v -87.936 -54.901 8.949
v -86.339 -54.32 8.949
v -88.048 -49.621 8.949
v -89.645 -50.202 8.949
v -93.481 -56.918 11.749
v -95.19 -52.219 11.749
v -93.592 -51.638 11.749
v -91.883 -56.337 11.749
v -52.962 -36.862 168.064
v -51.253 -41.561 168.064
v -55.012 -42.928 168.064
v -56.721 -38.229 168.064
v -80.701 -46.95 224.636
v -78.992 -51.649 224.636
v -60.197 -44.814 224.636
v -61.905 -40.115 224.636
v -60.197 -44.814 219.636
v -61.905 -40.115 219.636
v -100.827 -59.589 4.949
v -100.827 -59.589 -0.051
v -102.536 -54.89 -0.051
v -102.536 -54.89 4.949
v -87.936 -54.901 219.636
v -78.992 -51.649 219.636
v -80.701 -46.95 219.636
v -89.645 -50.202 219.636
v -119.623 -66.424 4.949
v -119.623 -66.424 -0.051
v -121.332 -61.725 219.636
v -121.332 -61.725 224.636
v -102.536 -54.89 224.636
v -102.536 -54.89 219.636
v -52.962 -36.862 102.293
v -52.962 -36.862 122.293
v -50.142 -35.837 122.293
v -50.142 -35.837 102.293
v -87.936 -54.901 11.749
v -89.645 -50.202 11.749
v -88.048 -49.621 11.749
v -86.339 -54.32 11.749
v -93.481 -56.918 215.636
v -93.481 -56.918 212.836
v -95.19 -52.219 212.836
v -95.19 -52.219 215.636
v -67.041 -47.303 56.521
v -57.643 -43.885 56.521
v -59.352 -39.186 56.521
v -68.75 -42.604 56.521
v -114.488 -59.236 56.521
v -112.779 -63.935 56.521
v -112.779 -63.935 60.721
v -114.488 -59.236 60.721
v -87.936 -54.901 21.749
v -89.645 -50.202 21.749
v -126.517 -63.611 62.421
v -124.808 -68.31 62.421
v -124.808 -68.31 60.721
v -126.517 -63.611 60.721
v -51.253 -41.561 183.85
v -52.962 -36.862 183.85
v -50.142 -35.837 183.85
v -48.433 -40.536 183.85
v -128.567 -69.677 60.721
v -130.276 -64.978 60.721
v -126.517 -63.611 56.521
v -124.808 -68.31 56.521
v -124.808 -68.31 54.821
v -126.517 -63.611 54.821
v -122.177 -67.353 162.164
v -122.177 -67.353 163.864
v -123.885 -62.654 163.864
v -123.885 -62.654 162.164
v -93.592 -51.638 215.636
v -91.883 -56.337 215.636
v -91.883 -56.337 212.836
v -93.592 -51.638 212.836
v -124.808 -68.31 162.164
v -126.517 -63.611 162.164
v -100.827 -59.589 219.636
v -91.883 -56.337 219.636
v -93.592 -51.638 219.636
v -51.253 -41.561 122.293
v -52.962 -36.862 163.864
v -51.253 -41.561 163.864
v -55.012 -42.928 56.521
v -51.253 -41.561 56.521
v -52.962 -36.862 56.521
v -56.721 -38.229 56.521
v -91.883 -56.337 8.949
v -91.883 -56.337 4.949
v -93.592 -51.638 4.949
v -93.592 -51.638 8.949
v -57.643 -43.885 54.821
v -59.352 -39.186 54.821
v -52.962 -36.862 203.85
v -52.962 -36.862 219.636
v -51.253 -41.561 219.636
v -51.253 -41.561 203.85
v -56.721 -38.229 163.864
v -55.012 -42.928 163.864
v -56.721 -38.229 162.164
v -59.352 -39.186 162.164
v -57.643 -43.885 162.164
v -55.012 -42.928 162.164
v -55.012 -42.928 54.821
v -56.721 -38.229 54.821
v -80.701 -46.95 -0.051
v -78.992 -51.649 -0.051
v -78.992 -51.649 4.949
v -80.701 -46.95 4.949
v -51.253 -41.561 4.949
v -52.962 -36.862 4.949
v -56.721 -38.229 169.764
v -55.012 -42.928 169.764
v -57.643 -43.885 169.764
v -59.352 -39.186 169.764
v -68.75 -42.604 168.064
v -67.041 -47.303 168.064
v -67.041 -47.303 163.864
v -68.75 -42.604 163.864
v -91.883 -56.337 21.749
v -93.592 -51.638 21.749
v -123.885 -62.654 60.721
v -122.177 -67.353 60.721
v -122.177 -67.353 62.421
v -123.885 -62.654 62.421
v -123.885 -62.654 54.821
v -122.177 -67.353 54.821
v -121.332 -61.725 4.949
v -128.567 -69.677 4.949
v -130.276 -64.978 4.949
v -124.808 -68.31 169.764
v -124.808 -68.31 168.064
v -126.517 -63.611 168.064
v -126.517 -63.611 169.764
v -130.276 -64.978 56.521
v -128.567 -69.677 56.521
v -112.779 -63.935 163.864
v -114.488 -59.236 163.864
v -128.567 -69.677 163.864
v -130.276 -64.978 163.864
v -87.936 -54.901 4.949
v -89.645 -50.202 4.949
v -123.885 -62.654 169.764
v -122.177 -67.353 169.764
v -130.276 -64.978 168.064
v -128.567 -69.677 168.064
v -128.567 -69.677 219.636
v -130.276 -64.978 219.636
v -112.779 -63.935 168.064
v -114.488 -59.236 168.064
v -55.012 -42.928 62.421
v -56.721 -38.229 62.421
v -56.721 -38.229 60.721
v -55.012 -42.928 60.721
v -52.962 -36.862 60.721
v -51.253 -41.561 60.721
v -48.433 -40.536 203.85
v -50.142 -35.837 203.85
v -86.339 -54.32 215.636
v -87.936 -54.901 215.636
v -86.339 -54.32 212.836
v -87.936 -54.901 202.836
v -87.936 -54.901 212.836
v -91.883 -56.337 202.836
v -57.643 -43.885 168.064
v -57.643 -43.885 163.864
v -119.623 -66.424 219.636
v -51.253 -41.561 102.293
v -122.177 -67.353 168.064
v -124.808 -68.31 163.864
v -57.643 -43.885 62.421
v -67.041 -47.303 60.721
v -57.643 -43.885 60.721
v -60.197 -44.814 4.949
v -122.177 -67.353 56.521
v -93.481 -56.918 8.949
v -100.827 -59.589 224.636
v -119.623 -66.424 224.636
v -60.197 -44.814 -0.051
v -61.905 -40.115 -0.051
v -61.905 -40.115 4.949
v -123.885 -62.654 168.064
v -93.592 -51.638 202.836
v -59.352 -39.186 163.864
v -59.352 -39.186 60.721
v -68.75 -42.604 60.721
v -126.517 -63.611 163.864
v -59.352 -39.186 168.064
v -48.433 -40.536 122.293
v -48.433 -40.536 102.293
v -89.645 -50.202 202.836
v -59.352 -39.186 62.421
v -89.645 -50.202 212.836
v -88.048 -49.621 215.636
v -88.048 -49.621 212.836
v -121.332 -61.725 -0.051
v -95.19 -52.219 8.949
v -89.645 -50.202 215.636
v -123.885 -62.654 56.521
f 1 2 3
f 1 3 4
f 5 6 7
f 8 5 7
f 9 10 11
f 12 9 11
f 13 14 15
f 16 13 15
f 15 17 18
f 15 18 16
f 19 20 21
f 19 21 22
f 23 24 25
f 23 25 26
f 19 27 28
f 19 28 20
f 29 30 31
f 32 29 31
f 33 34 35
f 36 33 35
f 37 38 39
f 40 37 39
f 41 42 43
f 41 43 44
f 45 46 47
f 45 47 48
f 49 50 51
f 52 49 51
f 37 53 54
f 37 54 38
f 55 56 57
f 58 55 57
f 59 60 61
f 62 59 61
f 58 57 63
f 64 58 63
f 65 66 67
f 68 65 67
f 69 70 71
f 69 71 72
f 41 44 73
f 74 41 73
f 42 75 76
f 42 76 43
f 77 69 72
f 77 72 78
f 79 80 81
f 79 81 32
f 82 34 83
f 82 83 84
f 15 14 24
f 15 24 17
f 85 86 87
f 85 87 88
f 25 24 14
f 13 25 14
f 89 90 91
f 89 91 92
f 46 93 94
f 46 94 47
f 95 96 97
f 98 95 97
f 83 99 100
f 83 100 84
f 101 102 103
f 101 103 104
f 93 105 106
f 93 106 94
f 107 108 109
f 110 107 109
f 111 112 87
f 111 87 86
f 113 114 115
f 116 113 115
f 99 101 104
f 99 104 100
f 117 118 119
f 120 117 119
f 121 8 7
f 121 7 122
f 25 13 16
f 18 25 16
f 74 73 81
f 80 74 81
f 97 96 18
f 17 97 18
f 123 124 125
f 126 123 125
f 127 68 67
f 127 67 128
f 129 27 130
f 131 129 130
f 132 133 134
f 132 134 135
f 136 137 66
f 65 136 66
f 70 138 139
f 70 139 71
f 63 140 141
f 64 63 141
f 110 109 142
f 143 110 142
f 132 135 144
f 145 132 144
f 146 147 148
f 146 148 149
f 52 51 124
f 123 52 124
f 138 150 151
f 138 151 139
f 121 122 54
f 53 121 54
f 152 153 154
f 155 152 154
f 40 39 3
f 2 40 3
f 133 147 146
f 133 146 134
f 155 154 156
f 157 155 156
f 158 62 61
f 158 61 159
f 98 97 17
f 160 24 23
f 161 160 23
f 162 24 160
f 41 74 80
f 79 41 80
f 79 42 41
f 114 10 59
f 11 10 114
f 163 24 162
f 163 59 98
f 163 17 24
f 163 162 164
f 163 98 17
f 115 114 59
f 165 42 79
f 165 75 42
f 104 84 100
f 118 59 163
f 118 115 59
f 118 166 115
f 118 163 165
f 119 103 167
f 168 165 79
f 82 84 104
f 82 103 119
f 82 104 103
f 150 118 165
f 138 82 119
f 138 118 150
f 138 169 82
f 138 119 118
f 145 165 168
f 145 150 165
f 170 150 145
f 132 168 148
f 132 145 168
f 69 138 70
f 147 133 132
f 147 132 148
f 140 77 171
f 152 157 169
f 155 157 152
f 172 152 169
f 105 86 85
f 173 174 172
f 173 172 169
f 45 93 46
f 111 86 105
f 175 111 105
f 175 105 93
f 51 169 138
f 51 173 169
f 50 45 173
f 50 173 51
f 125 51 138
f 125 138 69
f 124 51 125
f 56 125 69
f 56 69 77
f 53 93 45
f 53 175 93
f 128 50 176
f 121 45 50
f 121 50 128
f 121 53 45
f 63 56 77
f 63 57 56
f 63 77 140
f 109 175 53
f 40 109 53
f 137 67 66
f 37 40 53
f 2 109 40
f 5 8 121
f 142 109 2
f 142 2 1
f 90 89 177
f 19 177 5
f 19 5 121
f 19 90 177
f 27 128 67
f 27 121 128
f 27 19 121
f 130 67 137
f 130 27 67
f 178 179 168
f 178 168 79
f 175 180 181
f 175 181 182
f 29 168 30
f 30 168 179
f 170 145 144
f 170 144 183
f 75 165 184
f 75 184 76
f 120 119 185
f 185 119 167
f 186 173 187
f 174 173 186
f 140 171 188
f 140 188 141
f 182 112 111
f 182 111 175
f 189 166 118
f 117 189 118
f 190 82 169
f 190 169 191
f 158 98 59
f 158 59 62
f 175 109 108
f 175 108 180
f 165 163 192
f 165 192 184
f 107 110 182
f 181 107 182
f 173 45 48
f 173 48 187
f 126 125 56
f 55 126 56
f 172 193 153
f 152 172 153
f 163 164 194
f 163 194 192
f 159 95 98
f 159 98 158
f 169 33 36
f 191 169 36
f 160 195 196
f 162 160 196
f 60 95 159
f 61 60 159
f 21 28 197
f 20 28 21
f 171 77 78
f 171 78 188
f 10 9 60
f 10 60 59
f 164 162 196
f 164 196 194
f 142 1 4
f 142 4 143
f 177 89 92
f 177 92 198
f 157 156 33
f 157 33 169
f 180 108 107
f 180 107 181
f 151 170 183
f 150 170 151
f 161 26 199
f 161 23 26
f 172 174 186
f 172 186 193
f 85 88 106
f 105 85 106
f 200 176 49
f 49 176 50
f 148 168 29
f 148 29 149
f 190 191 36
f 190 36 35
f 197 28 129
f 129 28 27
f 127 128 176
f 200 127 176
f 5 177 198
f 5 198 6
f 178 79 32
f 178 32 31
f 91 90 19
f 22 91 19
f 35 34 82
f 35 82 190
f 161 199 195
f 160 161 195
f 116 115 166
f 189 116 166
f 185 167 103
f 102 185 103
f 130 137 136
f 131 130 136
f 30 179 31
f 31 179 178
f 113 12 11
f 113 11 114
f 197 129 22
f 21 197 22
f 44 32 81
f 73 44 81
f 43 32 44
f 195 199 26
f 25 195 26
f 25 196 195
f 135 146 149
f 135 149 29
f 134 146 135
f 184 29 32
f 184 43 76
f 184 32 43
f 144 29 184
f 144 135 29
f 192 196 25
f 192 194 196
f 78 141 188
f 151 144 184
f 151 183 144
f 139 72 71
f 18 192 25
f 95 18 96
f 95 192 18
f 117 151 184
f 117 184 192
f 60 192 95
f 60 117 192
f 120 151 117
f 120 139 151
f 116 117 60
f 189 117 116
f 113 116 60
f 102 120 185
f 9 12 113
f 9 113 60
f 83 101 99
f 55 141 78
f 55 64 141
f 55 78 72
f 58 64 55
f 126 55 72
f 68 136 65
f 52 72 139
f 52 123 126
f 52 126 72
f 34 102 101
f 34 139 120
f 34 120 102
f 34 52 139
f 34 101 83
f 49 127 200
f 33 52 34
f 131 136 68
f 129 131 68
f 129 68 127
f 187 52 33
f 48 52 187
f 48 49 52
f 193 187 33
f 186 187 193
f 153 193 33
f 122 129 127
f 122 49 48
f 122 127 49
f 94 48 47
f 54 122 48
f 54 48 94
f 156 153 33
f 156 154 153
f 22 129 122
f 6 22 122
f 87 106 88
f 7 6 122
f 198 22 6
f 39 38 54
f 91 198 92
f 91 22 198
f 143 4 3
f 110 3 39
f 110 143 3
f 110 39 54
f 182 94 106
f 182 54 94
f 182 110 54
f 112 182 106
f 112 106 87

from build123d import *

# Parameters (mm, degrees)
BOSS_EXTRUDE1_DEPTH = 214.686455
CUT_EXTRUDE3_DEPTH  = 32.423010849
SKETCH5_W           = 20
SKETCH5_H           = 5
SKETCH5_W_2         = 3
SKETCH5_H_2         = 20
BOSS_EXTRUDE2_DEPTH = 5


with BuildPart() as part:
    # Sketch2 → Boss-Extrude1 (new body)
    with BuildSketch(Plane.XY.offset(4.949356739)):
        Polygon((-52.961538618, -36.862052104), (-51.252736373, -41.56098761), (-128.567156233, -69.67694155), (-130.275958479, -64.978006044), align=None)
    extrude(amount=BOSS_EXTRUDE1_DEPTH)

    # Sketch4 → Cut-Extrude3 (cut, through all)
    with BuildSketch(Plane(origin=(7.362313595, -20.245196221, 0), x_dir=(-0.939787101, -0.341760449, 0), z_dir=(0.341760449, -0.939787101, 0))):
        Polygon((101.40457011, -4.949356739), (105.60457011, -4.949356739), (105.60457011, -8.949356739), (107.30457011, -8.949356739), (107.30457011, -11.749356739), (105.60457011, -11.749356739), (105.60457011, -21.749356739), (101.40457011, -21.749356739), (101.40457011, -11.749356739), (99.70457011, -11.749356739), (99.70457011, -8.949356739), (101.40457011, -8.949356739), align=None)
        Polygon((62.37056233, -60.720970532), (62.37056233, -56.520970532), (66.37056233, -56.520970532), (66.37056233, -54.820970532), (69.17056233, -54.820970532), (69.17056233, -56.520970532), (79.17056233, -56.520970532), (79.17056233, -60.720970532), (69.17056233, -60.720970532), (69.17056233, -62.420970532), (66.37056233, -62.420970532), (66.37056233, -60.720970532), align=None)
        Polygon((105.60457011, -219.635811913), (101.40457011, -219.635811913), (101.40457011, -215.635811913), (99.70457011, -215.635811913), (99.70457011, -212.835811913), (101.40457011, -212.835811913), (101.40457011, -202.835811913), (105.60457011, -202.835811913), (105.60457011, -212.835811913), (107.30457011, -212.835811913), (107.30457011, -215.635811913), (105.60457011, -215.635811913), align=None)
        Polygon((66.37056233, -168.064198119), (66.37056233, -169.764198119), (69.17056233, -169.764198119), (69.17056233, -168.064198119), (79.17056233, -168.064198119), (79.17056233, -163.864198119), (69.17056233, -163.864198119), (69.17056233, -162.164198119), (66.37056233, -162.164198119), (66.37056233, -163.864198119), (62.37056233, -163.864198119), (62.37056233, -168.064198119), align=None)
        Polygon((144.638577891, -163.864198119), (144.638577891, -168.064198119), (140.638577891, -168.064198119), (140.638577891, -169.764198119), (137.838577891, -169.764198119), (137.838577891, -168.064198119), (127.838577891, -168.064198119), (127.838577891, -163.864198119), (137.838577891, -163.864198119), (137.838577891, -162.164198119), (140.638577891, -162.164198119), (140.638577891, -163.864198119), align=None)
        Polygon((140.638577891, -56.520970532), (140.638577891, -54.820970532), (137.838577891, -54.820970532), (137.838577891, -56.520970532), (127.838577891, -56.520970532), (127.838577891, -60.720970532), (137.838577891, -60.720970532), (137.838577891, -62.420970532), (140.638577891, -62.420970532), (140.638577891, -60.720970532), (144.638577891, -60.720970532), (144.638577891, -56.520970532), align=None)
    extrude(amount=-CUT_EXTRUDE3_DEPTH, mode=Mode.SUBTRACT)

    # Sketch5 → Boss-Extrude2 (add)
    with BuildSketch(Plane(origin=(7.362313595, -20.245196221, 0), x_dir=(0.939787101, 0.341760449, 0), z_dir=(0.341760449, -0.939787101, 0))):
        with Locations((-81.88756622, 2.449356739)):
            Rectangle(SKETCH5_W, SKETCH5_H)
        with Locations((-125.121574, 2.449356739)):
            Rectangle(SKETCH5_W, SKETCH5_H)
        with Locations((-60.87056233, 112.292584326)):
            Rectangle(SKETCH5_W_2, SKETCH5_H_2)
        with Locations((-60.87056233, 193.850005016)):
            Rectangle(SKETCH5_W_2, SKETCH5_H_2)
        with Locations((-81.88756622, 222.135811913)):
            Rectangle(SKETCH5_W, SKETCH5_H)
        with Locations((-125.121574, 222.135811913)):
            Rectangle(SKETCH5_W, SKETCH5_H)
    extrude(amount=-BOSS_EXTRUDE2_DEPTH)


solid = part.part
